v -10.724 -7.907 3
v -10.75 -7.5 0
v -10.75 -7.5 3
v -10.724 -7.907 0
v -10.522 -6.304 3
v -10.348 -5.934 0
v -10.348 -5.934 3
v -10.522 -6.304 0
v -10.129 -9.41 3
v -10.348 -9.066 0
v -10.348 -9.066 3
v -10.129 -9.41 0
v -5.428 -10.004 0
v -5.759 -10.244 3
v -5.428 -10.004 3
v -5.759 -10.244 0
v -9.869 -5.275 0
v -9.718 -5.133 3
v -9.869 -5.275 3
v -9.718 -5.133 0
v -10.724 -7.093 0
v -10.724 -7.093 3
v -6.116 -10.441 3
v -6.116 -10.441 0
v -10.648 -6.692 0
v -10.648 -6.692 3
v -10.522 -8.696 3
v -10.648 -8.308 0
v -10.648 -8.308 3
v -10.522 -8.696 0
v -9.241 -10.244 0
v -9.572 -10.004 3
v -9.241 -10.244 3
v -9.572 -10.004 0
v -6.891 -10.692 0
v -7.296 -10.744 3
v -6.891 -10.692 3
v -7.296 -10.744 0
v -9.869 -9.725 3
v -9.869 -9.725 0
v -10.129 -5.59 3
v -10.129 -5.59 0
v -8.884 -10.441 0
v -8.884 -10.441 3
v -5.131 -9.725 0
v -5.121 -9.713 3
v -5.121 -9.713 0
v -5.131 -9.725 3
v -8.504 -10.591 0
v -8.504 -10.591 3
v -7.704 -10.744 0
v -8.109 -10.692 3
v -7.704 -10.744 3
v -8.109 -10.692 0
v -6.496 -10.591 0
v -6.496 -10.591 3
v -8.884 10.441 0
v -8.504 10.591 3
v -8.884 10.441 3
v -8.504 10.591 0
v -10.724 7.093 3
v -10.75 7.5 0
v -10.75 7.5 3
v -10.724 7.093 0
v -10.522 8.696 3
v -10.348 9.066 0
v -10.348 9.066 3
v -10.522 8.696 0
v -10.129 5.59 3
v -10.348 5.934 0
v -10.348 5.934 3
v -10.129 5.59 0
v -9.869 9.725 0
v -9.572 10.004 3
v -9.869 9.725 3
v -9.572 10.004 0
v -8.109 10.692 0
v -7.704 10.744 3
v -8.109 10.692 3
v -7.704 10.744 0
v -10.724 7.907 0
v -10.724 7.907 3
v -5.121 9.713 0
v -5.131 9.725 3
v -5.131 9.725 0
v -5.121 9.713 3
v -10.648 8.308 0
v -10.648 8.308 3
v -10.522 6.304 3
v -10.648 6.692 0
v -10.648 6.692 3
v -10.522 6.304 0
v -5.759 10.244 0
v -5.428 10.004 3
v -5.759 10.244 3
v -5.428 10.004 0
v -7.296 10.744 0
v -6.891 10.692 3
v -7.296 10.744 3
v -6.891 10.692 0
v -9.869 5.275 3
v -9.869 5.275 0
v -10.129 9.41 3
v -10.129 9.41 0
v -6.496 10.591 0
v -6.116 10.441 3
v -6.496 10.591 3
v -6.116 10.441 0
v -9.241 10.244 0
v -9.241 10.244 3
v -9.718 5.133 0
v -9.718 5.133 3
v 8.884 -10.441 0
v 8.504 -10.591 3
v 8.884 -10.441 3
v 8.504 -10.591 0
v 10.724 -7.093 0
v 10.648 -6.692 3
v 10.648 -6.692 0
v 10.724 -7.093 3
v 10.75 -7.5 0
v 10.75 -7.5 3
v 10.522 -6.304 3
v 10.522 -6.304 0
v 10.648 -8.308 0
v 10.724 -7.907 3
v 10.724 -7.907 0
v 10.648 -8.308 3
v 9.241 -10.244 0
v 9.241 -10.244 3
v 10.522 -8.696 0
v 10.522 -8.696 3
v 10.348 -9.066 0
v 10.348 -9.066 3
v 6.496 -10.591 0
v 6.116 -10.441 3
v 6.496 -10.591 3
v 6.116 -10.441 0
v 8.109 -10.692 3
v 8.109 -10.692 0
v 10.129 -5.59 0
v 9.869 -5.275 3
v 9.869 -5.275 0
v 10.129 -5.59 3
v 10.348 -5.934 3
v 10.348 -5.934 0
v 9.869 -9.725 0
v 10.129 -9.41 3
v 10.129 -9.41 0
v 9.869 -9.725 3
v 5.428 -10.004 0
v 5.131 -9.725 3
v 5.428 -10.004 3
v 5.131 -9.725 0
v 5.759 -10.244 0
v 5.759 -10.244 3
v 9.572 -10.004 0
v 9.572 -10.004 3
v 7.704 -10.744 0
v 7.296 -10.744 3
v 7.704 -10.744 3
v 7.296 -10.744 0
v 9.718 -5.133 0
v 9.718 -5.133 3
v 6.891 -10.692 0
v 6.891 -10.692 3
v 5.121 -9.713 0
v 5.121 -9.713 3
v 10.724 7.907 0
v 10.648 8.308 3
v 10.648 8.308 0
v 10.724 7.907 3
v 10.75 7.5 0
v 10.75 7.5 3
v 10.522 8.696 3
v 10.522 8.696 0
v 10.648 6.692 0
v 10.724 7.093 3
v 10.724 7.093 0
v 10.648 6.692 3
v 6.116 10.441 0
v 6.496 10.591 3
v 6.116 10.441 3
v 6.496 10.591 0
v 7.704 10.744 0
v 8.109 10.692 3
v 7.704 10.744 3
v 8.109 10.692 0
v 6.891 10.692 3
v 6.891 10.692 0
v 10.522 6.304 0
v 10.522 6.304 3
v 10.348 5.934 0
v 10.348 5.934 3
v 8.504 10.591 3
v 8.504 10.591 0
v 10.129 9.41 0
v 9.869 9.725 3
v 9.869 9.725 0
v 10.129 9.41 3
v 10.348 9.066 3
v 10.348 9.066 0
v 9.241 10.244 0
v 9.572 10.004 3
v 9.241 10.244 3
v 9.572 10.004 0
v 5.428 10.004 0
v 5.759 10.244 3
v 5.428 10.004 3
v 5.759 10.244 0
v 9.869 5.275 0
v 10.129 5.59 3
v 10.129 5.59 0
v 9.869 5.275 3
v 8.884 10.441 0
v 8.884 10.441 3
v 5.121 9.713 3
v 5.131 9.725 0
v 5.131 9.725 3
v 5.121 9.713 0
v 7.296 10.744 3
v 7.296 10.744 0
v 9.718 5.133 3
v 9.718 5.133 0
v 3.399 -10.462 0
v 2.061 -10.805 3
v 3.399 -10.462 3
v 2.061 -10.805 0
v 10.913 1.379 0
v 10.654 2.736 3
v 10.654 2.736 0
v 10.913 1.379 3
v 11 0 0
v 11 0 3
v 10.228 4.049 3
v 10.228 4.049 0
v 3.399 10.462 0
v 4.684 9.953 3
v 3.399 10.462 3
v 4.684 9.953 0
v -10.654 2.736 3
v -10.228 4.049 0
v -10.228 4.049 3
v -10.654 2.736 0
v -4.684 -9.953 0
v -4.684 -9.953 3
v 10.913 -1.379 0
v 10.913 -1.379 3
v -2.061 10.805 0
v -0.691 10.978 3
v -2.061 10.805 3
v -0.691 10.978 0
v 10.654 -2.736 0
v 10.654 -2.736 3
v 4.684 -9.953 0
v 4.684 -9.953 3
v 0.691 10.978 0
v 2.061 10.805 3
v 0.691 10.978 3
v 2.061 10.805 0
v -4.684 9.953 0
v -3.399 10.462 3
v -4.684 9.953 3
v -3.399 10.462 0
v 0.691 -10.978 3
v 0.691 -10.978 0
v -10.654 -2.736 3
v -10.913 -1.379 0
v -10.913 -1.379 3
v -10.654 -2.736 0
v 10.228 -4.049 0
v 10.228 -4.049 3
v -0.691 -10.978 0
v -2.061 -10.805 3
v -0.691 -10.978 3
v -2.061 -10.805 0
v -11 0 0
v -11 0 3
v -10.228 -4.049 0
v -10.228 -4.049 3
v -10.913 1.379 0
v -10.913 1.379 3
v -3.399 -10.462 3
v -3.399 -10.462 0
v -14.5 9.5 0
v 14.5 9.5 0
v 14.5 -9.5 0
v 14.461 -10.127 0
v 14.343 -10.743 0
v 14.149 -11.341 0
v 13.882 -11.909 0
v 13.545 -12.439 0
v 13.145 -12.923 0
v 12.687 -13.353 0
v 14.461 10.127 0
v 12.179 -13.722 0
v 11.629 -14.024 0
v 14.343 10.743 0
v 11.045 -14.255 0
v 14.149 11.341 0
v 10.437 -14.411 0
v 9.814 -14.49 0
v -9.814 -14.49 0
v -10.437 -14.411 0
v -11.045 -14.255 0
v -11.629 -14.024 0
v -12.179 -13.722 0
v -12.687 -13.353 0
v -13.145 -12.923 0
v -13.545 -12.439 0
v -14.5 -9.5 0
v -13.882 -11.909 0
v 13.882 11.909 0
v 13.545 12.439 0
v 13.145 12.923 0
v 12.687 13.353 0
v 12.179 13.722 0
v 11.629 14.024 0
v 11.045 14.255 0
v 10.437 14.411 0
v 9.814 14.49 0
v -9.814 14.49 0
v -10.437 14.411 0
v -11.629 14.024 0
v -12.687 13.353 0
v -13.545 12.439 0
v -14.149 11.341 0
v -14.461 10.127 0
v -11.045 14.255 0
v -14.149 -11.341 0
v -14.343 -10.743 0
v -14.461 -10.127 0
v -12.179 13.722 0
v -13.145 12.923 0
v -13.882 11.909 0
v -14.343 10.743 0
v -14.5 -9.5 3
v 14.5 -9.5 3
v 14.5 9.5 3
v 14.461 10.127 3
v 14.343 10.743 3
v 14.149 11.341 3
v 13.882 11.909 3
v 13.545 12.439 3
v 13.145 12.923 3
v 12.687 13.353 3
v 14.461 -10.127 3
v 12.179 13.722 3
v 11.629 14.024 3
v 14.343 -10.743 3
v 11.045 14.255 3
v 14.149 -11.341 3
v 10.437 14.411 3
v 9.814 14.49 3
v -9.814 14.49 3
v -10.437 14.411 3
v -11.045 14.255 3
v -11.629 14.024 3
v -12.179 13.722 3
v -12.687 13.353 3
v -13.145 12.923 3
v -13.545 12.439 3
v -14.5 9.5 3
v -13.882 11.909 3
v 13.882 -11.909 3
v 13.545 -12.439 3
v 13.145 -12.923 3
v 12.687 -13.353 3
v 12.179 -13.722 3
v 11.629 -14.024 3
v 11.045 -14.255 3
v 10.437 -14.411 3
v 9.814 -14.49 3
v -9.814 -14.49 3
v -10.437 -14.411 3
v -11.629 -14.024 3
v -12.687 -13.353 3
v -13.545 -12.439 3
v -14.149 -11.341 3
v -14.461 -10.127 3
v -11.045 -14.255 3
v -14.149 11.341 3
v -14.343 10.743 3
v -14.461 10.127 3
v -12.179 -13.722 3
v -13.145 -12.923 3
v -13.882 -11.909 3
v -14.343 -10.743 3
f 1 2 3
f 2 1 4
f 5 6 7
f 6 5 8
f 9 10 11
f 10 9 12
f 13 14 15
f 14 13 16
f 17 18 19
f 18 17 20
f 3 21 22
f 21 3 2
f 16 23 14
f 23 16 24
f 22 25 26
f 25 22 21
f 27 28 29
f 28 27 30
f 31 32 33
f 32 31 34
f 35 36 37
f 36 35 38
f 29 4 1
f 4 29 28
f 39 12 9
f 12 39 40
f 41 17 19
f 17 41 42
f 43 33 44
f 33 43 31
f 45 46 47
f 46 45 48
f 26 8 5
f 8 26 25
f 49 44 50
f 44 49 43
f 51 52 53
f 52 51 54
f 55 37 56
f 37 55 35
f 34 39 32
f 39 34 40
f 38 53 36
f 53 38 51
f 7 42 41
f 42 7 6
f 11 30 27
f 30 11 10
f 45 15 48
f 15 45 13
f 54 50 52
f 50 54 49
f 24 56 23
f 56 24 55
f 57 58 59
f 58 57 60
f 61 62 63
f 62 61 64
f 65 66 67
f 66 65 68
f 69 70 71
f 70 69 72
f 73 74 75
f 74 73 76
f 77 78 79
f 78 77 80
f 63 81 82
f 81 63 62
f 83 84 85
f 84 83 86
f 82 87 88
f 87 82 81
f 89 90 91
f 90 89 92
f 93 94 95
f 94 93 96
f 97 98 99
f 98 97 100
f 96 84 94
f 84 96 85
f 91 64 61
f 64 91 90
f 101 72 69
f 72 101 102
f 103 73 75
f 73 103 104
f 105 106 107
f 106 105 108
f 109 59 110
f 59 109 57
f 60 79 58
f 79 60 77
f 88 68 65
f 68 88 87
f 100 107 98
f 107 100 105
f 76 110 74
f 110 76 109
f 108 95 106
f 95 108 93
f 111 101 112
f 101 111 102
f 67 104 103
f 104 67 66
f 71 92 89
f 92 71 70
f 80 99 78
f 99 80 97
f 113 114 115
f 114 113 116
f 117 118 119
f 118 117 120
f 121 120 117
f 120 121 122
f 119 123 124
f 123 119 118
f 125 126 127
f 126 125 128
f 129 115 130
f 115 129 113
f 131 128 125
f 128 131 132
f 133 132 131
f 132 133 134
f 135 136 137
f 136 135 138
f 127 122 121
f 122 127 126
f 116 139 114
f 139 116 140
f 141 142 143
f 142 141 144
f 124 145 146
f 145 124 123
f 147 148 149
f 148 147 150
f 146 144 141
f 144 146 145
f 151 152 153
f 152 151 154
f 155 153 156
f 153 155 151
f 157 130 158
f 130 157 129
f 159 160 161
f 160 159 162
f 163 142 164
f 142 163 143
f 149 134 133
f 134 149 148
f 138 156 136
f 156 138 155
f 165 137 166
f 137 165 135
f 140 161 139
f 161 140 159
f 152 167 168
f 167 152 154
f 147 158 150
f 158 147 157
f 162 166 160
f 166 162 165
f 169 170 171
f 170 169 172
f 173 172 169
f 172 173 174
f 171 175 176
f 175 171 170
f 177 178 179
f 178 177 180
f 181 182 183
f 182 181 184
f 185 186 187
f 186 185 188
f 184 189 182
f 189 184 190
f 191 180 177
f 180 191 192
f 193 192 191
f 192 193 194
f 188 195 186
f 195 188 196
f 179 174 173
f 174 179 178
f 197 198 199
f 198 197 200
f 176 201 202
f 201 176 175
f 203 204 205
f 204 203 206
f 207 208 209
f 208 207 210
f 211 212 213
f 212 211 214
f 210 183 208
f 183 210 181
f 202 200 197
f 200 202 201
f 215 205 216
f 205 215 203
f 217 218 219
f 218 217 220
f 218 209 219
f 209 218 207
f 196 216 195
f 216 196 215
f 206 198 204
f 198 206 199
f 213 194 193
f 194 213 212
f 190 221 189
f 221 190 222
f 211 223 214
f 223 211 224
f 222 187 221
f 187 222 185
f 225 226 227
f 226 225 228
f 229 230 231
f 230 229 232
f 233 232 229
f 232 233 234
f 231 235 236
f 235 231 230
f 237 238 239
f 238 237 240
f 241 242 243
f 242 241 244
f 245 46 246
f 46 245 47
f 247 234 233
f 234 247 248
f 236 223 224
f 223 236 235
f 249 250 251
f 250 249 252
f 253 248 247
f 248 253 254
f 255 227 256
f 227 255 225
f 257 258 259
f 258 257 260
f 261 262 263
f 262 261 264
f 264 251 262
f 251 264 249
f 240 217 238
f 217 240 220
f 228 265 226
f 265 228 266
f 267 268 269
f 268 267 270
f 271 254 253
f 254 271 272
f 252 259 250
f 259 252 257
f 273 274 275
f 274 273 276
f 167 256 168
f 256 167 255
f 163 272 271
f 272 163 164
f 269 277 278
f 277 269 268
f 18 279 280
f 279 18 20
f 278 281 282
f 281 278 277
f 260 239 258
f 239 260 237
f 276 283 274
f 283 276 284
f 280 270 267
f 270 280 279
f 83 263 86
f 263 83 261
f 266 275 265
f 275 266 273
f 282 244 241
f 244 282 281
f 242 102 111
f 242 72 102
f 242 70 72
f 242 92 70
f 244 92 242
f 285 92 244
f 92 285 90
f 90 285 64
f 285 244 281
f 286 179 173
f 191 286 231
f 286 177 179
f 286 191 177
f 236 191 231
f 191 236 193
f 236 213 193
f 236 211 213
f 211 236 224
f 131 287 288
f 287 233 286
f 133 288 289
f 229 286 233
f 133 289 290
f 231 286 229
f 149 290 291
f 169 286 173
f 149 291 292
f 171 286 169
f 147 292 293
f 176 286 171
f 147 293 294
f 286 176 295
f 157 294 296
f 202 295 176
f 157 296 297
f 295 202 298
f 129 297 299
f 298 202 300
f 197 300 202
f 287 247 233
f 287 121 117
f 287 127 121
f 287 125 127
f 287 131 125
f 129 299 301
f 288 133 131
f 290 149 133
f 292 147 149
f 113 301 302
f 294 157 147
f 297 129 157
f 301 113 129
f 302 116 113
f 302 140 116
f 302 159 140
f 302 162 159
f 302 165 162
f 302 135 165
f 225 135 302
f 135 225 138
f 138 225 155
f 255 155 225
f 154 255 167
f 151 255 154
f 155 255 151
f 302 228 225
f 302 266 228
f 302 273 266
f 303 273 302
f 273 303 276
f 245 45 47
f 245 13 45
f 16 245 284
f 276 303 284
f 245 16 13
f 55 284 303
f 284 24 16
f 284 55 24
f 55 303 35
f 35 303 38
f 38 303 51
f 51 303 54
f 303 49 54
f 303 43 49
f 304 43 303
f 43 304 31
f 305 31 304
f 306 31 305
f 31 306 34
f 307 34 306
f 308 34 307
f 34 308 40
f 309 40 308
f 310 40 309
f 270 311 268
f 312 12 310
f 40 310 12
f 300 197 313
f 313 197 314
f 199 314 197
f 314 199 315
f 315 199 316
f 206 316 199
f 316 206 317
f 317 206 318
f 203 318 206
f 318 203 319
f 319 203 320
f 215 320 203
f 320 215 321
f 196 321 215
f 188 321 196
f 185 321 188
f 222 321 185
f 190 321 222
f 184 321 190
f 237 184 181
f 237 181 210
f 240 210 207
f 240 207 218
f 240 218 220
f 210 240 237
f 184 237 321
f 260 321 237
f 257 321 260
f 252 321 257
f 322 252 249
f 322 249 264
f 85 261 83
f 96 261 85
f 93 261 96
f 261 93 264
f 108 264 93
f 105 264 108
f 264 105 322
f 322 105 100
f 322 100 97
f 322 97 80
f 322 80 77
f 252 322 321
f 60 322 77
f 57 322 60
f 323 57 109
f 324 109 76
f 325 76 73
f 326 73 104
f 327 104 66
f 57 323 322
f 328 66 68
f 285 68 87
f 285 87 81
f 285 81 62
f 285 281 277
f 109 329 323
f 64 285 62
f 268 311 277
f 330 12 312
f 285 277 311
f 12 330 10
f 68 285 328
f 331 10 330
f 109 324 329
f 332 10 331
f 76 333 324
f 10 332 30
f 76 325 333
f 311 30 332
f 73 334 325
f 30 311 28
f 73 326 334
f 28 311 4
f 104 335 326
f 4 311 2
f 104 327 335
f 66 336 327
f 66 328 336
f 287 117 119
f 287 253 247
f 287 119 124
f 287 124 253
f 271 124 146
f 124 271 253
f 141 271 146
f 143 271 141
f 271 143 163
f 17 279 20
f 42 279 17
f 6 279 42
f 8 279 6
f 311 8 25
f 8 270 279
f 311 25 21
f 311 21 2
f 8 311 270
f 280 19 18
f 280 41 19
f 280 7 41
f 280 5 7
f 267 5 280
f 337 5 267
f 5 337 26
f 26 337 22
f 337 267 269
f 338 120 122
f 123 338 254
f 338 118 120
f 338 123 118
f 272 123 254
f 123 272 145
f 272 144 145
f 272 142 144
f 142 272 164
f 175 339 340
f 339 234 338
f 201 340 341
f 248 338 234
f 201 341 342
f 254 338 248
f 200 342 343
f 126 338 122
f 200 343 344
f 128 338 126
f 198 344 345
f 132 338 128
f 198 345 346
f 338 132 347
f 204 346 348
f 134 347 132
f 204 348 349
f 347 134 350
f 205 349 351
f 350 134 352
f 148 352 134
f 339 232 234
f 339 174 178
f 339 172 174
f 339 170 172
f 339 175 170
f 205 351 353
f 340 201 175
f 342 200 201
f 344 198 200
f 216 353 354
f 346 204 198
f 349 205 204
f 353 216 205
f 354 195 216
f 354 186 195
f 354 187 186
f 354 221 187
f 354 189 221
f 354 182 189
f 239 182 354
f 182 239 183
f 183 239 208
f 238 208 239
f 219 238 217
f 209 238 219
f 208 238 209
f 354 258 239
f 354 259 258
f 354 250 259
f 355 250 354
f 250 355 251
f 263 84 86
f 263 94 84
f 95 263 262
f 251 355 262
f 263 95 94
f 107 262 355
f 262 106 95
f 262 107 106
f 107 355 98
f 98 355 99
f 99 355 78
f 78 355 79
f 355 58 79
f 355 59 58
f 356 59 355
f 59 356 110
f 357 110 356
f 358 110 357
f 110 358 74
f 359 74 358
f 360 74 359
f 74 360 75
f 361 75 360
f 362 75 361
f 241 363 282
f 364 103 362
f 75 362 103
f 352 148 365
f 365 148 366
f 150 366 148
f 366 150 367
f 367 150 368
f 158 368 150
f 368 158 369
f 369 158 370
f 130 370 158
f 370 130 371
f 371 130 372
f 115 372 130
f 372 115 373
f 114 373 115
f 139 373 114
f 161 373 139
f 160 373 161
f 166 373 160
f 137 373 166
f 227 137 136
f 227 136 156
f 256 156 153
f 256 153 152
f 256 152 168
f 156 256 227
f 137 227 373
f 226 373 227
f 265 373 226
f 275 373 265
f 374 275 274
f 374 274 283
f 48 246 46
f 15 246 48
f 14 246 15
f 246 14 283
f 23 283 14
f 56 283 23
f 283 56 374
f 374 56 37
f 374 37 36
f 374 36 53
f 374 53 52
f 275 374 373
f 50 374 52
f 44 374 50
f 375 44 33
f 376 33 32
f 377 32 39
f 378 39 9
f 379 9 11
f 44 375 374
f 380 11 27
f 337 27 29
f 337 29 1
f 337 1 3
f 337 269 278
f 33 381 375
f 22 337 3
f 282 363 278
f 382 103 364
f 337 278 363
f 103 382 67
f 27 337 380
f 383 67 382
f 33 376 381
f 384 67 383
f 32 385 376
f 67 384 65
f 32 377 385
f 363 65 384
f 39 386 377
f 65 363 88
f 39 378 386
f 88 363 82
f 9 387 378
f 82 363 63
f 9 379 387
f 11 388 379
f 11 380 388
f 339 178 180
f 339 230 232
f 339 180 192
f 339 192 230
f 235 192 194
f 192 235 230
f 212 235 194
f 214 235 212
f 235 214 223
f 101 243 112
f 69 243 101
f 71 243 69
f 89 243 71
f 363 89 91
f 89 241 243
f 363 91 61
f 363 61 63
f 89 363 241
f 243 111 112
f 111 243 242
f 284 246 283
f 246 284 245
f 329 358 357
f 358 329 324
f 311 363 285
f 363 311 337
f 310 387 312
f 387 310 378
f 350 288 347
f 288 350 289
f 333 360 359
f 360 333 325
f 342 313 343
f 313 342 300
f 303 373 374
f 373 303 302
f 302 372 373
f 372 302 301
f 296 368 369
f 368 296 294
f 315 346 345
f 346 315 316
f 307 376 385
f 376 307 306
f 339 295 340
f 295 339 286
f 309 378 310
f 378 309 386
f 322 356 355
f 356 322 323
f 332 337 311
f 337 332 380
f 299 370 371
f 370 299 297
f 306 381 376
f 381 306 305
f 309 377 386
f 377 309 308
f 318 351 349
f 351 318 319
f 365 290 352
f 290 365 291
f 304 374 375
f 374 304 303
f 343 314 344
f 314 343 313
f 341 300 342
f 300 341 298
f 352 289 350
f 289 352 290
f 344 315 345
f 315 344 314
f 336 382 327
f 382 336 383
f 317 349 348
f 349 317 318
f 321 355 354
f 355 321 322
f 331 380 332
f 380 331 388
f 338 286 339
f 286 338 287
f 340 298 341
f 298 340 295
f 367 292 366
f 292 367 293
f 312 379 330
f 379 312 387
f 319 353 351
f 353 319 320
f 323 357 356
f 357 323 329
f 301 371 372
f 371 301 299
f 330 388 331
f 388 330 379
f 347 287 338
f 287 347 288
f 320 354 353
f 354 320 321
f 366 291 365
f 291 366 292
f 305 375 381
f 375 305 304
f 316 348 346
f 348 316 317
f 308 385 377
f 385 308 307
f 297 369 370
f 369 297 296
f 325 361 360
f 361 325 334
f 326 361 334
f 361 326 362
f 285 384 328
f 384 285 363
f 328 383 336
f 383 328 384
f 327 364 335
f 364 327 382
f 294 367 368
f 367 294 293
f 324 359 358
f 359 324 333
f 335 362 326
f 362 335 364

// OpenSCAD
$fn = 50;

difference() {
	union() {
		hull() {
			translate(v = [-9.5, 9.5, 0]) {
				cylinder(h = 3, r = 5);
			}
			translate(v = [9.5, 9.5, 0]) {
				cylinder(h = 3, r = 5);
			}
			translate(v = [-9.5, -9.5, 0]) {
				cylinder(h = 3, r = 5);
			}
			translate(v = [9.5, -9.5, 0]) {
				cylinder(h = 3, r = 5);
			}
		}
	}
	union() {
		translate(v = [-7.5, -7.5, -100.0]) {
			cylinder(h = 200, r = 3.25);
		}
		translate(v = [-7.5, 7.5, -100.0]) {
			cylinder(h = 200, r = 3.25);
		}
		translate(v = [7.5, -7.5, -100.0]) {
			cylinder(h = 200, r = 3.25);
		}
		translate(v = [7.5, 7.5, -100.0]) {
			cylinder(h = 200, r = 3.25);
		}
		translate(v = [-7.5, -7.5, -100.0]) {
			cylinder(h = 200, r = 1.8);
		}
		translate(v = [-7.5, 7.5, -100.0]) {
			cylinder(h = 200, r = 1.8);
		}
		translate(v = [7.5, -7.5, -100.0]) {
			cylinder(h = 200, r = 1.8);
		}
		translate(v = [7.5, 7.5, -100.0]) {
			cylinder(h = 200, r = 1.8);
		}
		cylinder(h = 3, r = 11.0);
	}
}
